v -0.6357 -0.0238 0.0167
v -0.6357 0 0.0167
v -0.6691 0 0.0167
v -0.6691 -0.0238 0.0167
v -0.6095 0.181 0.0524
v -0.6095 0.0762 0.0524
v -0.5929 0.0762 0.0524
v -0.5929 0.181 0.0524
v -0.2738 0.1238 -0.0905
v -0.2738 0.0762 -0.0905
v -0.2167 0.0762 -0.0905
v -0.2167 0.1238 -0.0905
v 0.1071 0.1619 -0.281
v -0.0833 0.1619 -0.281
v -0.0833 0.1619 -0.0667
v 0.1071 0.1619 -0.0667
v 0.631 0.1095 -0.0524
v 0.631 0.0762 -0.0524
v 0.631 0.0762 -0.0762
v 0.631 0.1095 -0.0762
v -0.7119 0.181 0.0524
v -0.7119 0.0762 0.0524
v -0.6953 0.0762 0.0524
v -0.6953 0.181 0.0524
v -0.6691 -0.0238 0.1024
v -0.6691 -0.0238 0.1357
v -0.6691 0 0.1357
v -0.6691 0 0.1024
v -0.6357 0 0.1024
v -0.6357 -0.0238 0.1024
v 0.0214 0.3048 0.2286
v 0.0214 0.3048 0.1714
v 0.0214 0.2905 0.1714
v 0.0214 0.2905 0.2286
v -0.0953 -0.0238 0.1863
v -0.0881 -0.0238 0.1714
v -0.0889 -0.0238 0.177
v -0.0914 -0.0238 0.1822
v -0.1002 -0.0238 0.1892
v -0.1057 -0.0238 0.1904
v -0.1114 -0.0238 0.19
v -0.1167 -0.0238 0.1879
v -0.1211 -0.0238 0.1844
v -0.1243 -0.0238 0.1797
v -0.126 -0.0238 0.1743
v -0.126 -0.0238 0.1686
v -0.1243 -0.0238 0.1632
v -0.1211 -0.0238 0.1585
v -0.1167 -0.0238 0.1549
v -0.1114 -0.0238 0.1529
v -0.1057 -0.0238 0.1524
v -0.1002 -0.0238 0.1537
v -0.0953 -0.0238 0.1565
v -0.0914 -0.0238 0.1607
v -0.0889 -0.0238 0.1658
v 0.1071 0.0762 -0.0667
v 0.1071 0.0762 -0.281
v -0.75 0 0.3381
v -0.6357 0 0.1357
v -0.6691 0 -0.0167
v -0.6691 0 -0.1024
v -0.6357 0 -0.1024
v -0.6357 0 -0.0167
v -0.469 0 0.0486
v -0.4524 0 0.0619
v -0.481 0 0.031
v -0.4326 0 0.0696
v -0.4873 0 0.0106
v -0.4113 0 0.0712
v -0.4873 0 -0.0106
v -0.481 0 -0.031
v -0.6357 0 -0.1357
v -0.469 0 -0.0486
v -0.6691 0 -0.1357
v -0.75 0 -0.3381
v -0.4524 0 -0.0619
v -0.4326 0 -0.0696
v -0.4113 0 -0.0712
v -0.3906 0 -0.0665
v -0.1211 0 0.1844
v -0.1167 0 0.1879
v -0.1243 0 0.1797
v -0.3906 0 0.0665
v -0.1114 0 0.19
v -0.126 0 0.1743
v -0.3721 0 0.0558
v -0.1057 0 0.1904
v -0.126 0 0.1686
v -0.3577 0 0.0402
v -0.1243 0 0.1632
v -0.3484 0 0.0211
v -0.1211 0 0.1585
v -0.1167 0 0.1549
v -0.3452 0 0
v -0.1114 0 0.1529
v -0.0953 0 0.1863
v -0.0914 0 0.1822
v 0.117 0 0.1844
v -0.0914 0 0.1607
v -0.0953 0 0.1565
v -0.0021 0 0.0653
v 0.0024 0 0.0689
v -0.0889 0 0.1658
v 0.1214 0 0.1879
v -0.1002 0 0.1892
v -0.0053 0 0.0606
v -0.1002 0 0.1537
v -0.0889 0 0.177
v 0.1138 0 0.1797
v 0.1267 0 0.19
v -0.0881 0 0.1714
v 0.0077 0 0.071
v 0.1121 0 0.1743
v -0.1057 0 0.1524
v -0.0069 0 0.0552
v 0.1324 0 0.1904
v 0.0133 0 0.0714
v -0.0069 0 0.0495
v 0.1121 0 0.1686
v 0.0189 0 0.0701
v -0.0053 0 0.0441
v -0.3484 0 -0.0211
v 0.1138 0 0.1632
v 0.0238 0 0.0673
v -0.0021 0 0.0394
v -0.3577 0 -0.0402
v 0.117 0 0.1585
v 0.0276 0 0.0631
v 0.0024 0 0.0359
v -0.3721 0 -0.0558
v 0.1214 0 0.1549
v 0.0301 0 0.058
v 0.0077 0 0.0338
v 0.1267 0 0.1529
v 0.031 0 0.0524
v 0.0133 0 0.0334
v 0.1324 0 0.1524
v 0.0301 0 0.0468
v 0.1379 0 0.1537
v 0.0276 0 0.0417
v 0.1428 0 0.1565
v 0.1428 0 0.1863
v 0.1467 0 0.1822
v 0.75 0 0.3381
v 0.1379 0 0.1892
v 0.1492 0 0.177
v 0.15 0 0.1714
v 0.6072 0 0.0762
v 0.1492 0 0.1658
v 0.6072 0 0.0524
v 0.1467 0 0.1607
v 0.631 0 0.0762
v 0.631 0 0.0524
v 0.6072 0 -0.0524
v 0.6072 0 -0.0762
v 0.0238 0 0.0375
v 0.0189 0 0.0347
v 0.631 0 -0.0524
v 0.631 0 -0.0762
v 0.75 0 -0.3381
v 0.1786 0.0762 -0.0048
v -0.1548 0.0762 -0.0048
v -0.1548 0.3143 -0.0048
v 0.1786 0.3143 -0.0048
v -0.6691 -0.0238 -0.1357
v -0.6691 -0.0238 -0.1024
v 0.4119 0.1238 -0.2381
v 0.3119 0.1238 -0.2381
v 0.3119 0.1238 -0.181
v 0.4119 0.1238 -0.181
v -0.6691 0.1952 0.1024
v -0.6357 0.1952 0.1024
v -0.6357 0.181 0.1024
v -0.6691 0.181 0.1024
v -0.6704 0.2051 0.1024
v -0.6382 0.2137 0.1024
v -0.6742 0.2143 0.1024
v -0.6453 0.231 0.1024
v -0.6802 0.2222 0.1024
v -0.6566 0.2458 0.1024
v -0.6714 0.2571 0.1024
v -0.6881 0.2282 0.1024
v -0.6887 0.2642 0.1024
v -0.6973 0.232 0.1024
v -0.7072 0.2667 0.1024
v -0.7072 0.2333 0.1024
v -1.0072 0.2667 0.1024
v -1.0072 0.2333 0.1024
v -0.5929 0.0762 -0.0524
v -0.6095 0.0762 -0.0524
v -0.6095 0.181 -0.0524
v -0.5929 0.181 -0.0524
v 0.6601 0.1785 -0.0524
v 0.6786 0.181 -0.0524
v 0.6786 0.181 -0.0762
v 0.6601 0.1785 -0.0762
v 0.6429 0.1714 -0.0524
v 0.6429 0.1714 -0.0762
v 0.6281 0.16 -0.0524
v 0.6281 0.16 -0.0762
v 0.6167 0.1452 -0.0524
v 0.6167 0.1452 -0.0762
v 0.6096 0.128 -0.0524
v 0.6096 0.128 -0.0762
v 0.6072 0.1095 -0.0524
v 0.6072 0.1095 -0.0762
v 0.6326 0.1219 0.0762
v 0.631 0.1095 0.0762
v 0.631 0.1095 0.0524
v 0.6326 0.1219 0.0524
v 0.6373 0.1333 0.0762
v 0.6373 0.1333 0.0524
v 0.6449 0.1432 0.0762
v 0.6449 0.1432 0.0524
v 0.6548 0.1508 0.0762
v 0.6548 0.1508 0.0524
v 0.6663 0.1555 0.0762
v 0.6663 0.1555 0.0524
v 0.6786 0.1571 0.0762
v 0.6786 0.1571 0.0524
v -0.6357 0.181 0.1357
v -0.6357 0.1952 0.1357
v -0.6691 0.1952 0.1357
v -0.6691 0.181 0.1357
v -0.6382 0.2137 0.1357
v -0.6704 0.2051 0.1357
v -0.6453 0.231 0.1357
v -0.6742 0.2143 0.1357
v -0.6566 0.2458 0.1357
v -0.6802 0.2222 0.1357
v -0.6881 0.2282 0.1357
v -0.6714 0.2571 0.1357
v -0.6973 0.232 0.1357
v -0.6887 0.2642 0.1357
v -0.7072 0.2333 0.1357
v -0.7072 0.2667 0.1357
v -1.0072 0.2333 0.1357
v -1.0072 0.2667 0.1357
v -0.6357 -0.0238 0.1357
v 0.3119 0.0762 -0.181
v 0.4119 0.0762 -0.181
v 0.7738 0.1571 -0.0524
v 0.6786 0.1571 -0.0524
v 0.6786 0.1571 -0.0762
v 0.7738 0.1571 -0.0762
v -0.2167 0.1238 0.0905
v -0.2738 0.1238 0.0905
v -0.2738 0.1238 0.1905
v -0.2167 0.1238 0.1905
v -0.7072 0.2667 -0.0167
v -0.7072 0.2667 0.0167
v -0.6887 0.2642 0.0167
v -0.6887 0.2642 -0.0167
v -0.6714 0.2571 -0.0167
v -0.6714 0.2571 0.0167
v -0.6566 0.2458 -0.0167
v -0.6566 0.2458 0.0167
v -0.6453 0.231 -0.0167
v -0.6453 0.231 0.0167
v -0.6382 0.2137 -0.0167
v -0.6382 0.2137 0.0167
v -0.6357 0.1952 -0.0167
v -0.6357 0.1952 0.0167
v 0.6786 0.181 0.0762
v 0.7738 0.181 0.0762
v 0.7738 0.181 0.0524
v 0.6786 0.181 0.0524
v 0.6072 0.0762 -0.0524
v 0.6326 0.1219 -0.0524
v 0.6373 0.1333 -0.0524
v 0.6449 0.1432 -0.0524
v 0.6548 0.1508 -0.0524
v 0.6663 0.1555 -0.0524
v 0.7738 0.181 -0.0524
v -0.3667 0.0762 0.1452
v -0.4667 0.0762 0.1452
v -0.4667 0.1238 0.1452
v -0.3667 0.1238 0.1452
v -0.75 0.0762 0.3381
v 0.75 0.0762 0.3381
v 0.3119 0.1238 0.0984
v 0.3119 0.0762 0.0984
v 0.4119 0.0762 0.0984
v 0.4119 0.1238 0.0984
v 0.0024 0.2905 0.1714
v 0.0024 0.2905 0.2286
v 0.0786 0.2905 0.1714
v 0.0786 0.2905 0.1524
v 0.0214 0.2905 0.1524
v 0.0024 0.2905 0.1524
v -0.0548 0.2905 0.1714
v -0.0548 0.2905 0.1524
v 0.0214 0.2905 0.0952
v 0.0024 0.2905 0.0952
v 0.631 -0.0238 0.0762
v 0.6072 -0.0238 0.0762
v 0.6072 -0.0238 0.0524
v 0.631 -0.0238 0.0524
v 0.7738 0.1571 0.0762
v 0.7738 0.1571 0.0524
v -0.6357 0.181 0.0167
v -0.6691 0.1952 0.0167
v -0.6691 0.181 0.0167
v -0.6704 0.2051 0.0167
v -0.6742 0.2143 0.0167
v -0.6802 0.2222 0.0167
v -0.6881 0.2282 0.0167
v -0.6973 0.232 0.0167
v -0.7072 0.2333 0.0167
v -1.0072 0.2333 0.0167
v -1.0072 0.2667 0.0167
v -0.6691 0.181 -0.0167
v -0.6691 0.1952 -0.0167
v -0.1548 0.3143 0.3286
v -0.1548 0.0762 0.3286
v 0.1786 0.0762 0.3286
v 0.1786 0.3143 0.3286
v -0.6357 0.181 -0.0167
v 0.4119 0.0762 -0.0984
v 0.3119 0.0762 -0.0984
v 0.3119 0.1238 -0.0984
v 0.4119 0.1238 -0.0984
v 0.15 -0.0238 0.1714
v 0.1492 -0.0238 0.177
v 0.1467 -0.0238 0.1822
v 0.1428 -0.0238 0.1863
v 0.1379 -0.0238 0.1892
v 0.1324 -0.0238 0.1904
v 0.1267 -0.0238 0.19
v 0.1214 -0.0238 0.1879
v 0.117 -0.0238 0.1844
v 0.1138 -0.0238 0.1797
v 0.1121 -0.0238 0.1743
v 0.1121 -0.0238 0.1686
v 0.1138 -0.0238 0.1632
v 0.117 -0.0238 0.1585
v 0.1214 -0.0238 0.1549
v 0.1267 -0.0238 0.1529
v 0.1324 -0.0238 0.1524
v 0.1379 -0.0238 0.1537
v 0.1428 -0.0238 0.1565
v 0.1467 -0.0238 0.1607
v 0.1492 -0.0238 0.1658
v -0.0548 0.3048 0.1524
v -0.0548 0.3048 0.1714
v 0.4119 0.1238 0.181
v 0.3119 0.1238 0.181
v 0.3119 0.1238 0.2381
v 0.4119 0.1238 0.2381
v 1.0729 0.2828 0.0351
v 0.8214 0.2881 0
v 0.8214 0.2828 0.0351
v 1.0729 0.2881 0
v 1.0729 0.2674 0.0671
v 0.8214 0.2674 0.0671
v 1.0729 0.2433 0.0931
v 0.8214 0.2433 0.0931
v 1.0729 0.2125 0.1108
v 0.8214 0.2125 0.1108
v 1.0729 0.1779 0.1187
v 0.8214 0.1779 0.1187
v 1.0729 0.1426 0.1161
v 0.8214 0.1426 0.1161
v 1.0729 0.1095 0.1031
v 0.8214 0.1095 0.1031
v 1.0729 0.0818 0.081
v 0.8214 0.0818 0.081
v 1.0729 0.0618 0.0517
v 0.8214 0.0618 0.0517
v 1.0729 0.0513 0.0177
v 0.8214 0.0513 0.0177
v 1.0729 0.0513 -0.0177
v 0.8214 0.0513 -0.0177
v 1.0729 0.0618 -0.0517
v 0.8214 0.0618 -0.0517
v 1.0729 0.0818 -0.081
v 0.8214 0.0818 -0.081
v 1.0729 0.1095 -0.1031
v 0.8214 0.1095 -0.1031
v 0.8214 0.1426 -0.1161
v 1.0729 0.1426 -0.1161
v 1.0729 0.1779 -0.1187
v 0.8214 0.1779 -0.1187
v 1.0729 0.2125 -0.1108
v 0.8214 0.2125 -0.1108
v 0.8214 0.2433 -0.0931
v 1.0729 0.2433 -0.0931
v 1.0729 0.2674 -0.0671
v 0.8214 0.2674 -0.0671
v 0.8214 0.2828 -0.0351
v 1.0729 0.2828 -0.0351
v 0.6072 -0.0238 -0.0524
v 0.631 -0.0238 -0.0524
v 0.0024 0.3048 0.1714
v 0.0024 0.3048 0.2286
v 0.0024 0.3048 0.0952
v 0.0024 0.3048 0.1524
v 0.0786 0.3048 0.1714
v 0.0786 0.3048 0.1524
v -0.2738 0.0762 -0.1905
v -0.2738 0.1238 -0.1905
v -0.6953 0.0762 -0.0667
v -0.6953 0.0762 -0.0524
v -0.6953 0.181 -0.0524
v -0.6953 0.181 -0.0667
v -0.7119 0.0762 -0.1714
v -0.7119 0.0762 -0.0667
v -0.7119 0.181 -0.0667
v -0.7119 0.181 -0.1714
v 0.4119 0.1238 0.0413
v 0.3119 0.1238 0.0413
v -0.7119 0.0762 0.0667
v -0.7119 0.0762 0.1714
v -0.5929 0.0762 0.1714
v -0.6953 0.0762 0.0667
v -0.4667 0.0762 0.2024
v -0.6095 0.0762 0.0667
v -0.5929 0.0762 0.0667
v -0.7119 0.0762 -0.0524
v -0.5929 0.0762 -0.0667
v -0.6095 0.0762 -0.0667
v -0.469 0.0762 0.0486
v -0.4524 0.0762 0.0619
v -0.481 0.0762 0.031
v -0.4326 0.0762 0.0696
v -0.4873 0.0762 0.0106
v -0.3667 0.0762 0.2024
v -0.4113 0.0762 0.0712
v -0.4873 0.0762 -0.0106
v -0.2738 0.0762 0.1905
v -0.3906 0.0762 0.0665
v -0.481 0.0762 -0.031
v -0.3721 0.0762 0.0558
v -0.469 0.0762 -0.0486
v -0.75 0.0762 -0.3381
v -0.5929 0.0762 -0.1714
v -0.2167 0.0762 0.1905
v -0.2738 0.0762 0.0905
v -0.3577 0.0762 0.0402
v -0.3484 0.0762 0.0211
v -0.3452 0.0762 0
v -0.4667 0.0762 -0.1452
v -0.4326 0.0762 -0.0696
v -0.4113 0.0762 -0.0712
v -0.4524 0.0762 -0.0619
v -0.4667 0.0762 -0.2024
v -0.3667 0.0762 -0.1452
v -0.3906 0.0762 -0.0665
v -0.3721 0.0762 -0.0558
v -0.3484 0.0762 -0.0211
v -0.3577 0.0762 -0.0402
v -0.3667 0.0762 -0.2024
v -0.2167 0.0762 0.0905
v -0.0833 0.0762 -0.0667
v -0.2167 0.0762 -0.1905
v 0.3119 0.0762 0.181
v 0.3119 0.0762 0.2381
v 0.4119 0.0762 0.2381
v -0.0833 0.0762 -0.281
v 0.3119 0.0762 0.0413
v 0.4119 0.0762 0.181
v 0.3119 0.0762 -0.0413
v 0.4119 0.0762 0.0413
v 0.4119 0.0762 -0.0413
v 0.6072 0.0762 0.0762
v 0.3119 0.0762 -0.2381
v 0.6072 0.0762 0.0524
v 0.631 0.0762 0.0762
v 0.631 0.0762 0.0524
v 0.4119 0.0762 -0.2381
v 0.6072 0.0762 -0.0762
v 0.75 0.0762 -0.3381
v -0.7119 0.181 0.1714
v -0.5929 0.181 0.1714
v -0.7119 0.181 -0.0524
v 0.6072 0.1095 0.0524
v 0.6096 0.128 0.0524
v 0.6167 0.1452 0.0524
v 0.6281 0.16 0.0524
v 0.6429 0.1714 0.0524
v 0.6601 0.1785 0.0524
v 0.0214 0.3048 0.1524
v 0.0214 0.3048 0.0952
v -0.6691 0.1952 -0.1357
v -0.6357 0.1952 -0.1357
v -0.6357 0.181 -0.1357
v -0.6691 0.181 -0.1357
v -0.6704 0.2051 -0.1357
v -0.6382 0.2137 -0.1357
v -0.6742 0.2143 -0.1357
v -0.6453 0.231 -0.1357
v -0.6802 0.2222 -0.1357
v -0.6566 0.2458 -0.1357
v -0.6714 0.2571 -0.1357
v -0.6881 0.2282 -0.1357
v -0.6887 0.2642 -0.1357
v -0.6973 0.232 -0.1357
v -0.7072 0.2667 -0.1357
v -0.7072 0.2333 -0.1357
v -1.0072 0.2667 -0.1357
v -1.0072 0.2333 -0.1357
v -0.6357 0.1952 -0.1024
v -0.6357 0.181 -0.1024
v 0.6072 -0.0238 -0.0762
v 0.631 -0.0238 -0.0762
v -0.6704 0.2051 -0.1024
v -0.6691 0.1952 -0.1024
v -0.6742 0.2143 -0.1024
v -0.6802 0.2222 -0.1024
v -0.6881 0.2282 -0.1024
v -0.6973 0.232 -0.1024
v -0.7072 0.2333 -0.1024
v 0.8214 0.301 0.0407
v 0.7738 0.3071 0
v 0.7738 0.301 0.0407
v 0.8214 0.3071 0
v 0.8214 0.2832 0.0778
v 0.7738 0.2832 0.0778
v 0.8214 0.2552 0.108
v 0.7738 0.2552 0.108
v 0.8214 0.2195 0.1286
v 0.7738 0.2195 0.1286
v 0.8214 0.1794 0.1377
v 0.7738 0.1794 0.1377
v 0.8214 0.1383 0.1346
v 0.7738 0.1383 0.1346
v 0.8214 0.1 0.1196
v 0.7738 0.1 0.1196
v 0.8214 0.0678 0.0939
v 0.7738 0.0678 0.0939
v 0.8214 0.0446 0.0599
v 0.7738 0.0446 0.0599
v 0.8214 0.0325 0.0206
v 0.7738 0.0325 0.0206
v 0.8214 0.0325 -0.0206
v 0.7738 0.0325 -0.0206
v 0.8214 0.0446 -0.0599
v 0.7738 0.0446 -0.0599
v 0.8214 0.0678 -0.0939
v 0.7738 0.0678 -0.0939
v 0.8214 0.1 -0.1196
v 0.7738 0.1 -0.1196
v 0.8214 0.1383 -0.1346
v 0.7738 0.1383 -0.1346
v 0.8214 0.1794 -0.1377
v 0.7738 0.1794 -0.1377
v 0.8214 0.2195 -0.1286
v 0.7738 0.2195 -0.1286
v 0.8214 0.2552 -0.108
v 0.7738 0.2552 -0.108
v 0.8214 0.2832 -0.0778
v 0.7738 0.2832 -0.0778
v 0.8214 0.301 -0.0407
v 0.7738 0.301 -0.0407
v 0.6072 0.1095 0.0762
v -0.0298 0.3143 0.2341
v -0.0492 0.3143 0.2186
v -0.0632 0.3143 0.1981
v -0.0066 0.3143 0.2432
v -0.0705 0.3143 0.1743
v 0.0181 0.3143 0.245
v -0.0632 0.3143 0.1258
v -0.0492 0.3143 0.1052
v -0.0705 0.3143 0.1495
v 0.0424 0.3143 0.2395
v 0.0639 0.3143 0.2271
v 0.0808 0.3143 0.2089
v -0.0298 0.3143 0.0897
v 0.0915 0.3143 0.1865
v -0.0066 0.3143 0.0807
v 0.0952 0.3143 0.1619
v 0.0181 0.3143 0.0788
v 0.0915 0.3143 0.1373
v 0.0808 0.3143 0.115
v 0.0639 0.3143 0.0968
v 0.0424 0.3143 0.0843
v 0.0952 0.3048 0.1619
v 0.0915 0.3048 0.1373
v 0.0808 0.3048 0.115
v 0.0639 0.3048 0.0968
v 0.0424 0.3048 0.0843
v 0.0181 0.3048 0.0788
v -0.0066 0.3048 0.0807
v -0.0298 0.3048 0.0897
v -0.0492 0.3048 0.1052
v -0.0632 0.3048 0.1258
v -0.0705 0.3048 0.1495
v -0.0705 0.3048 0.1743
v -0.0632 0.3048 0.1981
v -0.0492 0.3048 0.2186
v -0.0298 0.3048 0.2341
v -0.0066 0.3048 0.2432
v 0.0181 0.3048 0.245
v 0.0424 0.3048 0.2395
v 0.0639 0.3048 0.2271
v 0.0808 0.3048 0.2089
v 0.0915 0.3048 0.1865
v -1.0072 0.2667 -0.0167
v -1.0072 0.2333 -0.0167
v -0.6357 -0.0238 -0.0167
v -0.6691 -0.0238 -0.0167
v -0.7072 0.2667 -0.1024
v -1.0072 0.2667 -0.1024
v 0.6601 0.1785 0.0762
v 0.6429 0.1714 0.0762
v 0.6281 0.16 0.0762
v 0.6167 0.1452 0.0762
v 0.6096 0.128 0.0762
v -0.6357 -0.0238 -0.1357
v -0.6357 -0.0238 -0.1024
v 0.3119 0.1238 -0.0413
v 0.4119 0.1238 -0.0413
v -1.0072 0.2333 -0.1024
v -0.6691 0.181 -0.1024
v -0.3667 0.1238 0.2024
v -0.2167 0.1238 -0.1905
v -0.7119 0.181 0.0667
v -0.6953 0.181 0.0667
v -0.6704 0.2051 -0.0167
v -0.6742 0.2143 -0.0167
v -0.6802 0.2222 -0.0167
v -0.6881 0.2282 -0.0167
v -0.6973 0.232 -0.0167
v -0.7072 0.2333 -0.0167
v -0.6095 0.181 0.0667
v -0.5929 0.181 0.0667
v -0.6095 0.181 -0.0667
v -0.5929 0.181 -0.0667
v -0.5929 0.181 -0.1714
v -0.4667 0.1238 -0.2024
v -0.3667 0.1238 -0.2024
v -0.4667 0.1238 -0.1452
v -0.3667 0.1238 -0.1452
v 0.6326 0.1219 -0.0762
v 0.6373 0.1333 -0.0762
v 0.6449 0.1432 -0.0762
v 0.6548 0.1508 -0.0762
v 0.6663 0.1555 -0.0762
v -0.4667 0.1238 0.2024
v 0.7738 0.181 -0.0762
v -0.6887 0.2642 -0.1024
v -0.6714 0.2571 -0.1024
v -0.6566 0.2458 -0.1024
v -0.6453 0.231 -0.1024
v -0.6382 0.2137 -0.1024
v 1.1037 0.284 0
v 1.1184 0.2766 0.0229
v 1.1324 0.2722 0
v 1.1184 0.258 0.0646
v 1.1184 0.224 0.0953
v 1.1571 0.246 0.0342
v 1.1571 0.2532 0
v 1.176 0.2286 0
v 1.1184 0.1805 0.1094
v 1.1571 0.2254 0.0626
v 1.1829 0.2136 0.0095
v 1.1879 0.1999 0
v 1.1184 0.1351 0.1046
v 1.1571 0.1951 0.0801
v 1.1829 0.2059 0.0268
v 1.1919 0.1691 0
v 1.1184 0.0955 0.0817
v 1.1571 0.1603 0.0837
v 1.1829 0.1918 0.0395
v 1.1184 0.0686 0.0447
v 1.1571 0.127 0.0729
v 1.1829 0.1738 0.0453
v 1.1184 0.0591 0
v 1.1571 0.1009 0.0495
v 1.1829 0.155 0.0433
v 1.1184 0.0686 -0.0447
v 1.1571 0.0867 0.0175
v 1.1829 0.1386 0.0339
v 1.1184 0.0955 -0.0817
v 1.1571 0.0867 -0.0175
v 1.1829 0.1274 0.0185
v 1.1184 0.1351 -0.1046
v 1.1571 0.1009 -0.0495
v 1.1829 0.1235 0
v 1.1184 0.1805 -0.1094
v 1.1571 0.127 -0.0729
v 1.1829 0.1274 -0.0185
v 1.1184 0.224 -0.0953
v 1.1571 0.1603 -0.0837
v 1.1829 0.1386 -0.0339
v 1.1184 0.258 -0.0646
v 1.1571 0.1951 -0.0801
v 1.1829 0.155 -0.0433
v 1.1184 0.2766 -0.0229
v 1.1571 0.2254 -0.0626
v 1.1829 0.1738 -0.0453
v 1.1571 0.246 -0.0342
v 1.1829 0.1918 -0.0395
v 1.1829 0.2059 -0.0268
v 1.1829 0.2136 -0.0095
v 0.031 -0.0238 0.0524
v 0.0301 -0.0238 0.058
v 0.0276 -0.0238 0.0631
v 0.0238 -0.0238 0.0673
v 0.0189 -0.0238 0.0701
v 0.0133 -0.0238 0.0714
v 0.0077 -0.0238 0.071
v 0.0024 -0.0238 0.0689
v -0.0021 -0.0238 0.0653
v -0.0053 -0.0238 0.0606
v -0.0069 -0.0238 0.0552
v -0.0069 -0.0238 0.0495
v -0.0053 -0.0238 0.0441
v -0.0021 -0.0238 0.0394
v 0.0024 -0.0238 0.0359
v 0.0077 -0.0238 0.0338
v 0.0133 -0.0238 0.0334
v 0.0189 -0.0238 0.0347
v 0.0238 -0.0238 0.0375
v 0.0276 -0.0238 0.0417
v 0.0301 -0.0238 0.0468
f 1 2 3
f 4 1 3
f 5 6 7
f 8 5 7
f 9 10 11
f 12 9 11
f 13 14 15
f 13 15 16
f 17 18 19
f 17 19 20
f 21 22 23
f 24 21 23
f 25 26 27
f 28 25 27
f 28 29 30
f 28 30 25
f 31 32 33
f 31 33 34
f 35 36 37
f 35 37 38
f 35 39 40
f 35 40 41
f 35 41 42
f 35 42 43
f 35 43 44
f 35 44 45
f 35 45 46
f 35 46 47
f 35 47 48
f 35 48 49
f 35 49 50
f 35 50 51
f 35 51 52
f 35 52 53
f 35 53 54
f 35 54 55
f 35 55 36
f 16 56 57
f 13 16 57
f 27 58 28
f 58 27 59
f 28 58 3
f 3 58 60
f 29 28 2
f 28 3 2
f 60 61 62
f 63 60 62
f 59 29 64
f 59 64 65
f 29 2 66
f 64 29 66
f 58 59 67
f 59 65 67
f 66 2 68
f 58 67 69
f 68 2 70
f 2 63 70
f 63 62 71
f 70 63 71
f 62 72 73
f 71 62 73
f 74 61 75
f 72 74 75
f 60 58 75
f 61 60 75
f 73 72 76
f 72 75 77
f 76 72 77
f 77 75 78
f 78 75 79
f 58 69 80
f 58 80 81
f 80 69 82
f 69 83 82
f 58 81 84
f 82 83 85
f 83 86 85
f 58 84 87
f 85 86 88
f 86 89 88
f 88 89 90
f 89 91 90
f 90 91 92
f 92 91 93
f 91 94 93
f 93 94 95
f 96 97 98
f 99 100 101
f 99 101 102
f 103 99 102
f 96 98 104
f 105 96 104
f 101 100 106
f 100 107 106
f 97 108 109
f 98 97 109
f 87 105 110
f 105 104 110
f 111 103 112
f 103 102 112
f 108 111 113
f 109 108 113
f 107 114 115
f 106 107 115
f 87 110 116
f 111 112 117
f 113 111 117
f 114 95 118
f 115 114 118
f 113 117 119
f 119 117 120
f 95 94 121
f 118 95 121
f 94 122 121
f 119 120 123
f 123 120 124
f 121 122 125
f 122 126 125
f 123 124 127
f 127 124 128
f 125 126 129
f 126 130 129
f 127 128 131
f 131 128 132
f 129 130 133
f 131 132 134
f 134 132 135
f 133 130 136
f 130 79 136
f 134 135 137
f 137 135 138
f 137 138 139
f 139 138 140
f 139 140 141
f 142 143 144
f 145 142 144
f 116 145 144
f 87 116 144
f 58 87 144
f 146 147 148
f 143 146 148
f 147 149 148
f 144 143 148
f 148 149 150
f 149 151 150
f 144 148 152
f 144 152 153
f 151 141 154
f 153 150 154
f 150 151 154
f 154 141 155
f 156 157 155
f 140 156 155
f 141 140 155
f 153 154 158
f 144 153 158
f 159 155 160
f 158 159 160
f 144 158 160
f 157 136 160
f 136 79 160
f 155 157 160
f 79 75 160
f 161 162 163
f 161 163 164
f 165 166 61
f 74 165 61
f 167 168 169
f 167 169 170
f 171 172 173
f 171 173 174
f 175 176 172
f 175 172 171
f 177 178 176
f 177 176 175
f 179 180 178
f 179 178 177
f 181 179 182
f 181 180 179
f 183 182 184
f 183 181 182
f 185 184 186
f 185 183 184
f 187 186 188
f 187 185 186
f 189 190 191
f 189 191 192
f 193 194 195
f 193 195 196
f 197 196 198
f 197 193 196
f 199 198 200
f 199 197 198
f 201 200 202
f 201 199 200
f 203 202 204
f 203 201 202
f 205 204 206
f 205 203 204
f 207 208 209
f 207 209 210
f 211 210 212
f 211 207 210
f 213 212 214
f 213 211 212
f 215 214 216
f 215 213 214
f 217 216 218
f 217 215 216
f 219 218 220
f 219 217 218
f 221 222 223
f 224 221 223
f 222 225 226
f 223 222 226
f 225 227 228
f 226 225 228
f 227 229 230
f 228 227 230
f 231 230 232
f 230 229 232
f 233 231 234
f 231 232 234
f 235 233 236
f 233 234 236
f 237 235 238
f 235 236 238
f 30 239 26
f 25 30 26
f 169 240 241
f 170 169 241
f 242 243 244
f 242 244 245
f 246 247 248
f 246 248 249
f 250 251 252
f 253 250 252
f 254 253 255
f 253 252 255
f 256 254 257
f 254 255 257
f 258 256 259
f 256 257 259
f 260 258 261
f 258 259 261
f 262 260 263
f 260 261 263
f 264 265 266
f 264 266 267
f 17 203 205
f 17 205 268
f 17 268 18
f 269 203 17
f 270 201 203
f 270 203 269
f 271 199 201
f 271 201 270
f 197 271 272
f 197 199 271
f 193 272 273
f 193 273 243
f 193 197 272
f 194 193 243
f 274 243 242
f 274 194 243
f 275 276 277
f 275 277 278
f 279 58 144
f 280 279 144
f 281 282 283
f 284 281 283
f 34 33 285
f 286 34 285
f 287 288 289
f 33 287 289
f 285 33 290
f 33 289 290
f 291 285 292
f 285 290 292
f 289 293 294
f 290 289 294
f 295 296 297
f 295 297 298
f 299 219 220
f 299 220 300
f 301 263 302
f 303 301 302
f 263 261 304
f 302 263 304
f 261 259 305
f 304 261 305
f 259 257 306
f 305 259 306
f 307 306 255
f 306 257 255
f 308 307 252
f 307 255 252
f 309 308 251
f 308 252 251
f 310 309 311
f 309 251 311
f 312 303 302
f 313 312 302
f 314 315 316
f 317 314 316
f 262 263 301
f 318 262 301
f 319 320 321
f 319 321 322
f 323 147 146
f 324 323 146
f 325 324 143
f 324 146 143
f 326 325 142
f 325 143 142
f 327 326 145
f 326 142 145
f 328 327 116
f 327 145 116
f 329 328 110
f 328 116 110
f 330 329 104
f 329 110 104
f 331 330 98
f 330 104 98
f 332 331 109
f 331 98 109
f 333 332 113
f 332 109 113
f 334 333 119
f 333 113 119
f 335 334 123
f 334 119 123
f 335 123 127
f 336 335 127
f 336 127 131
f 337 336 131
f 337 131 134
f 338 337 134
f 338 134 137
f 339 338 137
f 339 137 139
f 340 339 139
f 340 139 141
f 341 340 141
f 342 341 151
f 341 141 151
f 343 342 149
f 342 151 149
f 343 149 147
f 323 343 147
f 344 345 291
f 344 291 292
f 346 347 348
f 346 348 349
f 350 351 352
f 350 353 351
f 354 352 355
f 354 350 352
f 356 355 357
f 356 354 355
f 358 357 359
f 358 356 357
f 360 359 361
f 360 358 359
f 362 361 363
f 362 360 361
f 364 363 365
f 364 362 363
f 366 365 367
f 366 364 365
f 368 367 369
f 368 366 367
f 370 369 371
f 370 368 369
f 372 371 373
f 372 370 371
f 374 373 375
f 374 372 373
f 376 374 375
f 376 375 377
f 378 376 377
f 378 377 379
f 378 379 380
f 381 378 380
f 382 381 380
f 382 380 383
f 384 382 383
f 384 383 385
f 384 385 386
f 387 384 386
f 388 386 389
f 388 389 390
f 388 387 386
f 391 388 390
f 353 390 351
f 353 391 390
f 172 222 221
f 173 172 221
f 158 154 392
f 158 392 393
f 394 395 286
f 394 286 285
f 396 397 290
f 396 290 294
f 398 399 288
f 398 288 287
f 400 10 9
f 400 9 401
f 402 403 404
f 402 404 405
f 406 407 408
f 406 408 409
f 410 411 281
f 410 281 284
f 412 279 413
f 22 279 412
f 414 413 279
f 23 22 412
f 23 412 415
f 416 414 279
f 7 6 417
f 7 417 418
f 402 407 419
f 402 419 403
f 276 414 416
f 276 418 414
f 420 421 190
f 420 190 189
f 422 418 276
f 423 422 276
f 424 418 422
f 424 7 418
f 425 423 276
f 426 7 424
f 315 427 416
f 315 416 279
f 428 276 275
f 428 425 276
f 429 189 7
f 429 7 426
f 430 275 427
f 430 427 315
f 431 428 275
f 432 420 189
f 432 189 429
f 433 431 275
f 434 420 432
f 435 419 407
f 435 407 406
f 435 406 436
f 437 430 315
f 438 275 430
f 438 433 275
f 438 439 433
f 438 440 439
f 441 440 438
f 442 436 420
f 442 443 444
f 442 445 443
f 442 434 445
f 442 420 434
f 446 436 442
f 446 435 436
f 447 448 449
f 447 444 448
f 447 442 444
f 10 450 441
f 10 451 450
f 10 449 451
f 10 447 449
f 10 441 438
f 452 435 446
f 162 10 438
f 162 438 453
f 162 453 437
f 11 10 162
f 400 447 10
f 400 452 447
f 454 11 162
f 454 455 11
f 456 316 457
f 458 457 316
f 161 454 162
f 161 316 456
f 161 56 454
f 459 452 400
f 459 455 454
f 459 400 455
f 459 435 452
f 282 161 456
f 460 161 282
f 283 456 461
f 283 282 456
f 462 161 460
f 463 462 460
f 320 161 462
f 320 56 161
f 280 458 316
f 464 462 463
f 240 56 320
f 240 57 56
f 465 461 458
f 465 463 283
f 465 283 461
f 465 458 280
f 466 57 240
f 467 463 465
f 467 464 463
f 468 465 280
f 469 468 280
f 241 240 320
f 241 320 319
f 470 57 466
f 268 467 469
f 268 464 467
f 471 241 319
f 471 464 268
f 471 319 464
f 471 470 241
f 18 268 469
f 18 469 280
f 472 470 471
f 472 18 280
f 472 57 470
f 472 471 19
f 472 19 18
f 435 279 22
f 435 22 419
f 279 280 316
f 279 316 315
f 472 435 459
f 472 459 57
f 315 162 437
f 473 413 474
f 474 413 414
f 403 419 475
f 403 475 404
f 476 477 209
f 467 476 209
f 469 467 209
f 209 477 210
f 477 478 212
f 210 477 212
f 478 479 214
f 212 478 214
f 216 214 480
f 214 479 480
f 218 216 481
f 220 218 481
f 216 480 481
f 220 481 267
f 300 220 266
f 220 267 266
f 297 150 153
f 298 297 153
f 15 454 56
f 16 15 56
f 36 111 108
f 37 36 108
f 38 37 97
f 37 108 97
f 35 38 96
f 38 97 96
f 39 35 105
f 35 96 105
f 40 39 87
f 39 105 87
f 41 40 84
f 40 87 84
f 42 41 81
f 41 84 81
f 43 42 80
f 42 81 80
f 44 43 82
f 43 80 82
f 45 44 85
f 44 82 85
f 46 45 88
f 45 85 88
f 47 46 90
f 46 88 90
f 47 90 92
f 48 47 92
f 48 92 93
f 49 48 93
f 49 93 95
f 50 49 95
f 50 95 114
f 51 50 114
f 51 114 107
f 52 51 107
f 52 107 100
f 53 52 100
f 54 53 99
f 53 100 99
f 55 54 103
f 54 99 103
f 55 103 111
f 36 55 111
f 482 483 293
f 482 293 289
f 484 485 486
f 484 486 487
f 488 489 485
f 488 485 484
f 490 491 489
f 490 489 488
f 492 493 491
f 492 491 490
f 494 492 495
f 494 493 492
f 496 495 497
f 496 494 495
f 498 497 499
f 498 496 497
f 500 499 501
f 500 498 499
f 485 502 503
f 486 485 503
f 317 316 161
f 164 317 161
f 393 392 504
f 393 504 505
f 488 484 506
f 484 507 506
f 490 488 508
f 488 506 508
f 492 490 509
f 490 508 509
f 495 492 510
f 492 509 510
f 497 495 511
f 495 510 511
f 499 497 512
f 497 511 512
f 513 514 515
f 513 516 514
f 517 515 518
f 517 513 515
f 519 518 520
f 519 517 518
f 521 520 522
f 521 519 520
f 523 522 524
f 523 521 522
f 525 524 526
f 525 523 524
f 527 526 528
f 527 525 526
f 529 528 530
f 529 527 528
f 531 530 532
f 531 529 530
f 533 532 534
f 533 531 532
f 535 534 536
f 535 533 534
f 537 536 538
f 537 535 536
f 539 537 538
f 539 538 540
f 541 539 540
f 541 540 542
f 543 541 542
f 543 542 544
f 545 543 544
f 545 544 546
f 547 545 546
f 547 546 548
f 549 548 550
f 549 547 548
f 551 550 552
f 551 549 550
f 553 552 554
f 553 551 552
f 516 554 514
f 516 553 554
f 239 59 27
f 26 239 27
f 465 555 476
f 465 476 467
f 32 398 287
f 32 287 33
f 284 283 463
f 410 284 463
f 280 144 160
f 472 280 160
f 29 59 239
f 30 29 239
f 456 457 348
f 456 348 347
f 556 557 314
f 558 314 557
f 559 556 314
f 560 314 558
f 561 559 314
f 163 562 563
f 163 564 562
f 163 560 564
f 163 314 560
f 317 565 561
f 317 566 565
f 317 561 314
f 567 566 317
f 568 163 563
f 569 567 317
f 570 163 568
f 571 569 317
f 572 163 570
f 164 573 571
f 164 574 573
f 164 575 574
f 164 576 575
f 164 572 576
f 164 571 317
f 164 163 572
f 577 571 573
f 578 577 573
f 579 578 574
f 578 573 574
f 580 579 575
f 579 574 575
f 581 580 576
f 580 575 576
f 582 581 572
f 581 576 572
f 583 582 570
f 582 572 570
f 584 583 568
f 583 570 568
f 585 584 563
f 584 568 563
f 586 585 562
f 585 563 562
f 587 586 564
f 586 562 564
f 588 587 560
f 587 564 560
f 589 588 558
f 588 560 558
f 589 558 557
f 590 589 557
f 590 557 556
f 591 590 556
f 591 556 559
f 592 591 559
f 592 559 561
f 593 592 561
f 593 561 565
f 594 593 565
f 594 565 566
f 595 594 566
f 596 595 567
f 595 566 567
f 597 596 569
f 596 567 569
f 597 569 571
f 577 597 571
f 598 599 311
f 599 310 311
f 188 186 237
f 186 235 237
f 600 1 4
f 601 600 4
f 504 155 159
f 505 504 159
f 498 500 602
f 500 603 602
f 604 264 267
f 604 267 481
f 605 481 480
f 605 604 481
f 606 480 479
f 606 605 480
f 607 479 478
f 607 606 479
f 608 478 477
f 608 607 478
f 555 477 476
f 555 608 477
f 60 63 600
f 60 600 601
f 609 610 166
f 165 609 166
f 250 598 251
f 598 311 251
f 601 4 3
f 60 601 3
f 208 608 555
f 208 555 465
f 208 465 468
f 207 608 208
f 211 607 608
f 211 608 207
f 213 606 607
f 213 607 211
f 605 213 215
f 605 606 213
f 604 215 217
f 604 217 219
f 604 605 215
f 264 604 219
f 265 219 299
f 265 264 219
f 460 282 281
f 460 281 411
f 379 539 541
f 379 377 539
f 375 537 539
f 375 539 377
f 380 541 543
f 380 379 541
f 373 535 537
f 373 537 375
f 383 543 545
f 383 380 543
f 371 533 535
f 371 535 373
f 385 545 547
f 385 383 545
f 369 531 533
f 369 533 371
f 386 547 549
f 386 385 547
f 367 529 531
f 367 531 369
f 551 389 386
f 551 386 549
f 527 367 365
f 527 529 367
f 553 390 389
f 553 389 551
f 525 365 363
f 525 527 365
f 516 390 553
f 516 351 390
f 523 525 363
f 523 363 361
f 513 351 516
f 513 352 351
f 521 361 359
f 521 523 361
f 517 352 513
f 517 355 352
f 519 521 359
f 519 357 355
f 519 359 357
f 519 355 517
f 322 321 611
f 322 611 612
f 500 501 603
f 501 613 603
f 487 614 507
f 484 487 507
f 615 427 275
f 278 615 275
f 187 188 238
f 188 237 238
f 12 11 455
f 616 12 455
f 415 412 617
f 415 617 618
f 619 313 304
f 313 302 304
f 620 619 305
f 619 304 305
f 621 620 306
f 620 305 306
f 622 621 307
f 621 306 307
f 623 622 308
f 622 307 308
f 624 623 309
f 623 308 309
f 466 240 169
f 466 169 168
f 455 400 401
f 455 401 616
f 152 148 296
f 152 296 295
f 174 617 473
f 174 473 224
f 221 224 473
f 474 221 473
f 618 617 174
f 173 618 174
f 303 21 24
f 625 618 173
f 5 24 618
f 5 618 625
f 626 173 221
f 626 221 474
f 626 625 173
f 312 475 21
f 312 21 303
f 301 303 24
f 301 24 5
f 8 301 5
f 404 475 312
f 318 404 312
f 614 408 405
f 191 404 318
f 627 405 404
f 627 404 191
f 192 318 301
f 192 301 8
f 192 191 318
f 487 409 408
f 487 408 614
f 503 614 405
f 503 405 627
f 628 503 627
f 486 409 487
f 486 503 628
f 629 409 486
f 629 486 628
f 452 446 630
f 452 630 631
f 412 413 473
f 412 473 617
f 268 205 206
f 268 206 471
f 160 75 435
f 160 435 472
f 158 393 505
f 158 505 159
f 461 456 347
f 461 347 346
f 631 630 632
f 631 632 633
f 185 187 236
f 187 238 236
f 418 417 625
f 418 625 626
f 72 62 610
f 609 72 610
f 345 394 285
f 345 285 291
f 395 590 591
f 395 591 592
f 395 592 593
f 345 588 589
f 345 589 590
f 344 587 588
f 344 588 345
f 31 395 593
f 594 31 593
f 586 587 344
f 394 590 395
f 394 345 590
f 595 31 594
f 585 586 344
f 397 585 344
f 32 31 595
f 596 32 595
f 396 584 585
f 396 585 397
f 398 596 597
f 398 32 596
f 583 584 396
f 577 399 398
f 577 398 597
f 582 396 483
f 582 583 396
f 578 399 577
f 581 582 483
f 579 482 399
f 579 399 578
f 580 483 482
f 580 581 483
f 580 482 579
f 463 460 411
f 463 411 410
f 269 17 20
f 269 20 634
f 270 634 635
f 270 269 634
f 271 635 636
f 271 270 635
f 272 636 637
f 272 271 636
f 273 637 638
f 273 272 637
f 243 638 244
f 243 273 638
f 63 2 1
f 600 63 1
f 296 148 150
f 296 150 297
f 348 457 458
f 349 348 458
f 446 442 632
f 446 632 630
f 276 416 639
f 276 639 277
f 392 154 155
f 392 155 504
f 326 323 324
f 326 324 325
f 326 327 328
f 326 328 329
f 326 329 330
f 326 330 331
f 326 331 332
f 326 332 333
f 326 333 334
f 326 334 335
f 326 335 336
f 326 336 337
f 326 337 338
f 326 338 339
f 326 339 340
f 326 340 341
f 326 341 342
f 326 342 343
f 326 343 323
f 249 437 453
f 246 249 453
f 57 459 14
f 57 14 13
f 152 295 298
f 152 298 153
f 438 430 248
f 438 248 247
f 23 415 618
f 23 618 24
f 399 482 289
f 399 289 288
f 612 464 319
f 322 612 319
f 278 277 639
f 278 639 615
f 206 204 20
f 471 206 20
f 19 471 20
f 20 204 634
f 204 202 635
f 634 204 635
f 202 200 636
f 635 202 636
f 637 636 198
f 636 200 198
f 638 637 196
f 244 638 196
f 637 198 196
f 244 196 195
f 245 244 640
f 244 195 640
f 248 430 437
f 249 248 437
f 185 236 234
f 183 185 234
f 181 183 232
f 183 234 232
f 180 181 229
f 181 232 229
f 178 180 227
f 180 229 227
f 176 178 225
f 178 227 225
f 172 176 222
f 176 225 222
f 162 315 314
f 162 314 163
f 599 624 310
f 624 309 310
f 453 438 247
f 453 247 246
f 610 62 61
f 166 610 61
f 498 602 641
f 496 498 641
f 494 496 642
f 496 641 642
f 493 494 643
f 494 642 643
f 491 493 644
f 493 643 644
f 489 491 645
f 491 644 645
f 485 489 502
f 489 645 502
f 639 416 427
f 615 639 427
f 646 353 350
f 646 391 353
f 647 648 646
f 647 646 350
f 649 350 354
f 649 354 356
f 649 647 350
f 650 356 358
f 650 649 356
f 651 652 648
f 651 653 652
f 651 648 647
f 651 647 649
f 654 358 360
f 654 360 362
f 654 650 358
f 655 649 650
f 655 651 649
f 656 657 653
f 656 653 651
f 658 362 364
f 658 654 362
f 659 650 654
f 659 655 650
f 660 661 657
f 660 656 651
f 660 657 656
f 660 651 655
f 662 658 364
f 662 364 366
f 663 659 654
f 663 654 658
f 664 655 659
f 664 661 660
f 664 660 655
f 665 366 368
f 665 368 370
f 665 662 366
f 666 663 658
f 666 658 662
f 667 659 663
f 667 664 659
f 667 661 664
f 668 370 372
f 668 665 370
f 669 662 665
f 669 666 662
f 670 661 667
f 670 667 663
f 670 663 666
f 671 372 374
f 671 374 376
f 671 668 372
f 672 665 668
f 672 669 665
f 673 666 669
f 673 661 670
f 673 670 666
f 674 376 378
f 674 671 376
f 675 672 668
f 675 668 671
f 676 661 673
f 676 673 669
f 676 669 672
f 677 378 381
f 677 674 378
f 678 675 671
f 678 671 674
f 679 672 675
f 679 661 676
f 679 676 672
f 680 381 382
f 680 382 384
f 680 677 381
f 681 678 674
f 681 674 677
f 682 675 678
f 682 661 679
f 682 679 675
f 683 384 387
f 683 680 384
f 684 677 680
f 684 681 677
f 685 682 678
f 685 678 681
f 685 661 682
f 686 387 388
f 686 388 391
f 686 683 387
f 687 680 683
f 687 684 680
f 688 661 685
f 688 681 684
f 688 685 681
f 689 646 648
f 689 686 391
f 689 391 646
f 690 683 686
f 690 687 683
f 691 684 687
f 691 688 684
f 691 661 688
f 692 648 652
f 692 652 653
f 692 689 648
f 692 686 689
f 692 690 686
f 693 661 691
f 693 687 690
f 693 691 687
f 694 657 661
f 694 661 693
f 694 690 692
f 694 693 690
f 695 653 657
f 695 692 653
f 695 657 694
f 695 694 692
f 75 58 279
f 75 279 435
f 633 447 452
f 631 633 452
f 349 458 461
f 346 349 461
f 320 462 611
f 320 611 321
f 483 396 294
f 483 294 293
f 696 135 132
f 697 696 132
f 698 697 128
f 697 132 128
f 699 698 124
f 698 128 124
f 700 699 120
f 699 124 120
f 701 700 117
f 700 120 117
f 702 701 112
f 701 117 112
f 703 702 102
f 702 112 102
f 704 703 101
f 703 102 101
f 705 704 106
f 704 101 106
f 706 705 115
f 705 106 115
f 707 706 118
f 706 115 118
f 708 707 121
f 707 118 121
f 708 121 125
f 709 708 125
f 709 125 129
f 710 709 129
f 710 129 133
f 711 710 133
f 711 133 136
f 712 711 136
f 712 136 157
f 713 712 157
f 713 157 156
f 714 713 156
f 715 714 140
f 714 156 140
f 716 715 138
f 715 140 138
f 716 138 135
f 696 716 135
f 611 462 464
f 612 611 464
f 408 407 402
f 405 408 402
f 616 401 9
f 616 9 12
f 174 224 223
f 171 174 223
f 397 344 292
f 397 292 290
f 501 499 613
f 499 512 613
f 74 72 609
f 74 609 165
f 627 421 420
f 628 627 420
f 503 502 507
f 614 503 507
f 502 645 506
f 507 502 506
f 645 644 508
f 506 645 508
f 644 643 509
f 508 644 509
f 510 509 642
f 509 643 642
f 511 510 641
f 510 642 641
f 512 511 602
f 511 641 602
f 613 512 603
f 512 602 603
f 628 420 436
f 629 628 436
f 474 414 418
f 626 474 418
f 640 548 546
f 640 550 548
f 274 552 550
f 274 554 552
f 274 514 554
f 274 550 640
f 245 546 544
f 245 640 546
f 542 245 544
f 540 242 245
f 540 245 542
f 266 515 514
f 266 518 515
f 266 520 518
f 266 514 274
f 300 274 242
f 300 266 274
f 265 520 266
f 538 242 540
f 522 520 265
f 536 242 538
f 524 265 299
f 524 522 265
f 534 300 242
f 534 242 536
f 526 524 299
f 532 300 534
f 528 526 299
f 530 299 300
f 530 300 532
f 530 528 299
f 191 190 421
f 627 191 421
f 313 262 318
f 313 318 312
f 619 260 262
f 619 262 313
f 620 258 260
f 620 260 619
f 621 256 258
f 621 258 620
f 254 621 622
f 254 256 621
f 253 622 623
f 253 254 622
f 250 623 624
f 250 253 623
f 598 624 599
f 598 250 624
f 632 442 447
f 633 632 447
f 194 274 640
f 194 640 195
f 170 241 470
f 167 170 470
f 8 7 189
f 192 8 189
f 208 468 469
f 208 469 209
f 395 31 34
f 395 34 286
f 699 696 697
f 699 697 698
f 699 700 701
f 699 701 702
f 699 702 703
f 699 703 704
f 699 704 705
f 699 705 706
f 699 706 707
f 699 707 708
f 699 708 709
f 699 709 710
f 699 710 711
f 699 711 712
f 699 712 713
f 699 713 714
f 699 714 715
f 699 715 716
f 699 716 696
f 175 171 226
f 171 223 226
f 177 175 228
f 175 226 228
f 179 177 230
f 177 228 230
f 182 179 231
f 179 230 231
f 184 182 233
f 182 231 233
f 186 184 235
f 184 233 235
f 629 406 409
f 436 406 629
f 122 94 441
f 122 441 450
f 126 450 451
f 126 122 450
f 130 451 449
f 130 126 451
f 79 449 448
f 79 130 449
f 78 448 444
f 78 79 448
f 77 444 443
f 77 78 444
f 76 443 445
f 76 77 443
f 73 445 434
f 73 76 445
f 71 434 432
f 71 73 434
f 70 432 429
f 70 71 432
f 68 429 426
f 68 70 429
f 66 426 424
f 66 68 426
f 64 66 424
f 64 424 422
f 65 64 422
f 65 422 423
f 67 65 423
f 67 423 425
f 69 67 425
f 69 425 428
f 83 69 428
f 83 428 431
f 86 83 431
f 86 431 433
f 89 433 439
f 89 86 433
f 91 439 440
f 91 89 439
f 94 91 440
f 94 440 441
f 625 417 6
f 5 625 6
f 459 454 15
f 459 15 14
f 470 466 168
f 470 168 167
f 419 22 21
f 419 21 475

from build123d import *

# Parameters (mm, degrees)
SKETCH_1_W             = 31.5
SKETCH_1_H             = 14.2
SKETCH_1_R             = 1.5
EXTRUDE_1_DEPTH        = 1.6
SKETCH_2_W             = 7
SKETCH_2_H             = 7
EXTRUDE_2_DEPTH        = 5
SKETCH_3_R             = 1.75
CUT_EXTRUDE_1_DEPTH    = 0.2
CUT_EXTRUDE_2_DEPTH    = 0.3
SKETCH_6_W             = 4
SKETCH_6_H             = 4.5
EXTRUDE_3_DEPTH        = 1.8
SKETCH_7_W             = 2.1
SKETCH_7_H             = 1.2
SKETCH_7_W_2           = 1.2
SKETCH_7_H_2           = 2.1
EXTRUDE_4_DEPTH        = 1
EXTRUDE_START          = 1.6
EXTRUDE_5_DEPTH        = 0.5
PATTERN_LINEAR_1_COUNT = 2
PATTERN_LINEAR_1_PITCH = 2.7
EXTRUDE_6_DEPTH        = 0.35
PATTERN_LINEAR_2_COUNT = 2
PATTERN_LINEAR_2_PITCH = 2.5
PATTERN_LINEAR_3_COUNT = 2
PATTERN_LINEAR_3_PITCH = 2.5
SKETCH_12_W            = 2.5
SKETCH_12_H            = 2.2
SKETCH_12_W_2          = 1.8
SKETCH_12_H_2          = 0.3
EXTRUDE_7_DEPTH        = 2.2
SKETCH_13_R            = 0.4
EXTRUDE_8_DEPTH        = 0.5
SCALE1_SCALE           = 0.04762


with BuildPart() as part:
    # Эскиз1 → Бобышка-Вытянуть1 (new body)
    with BuildSketch(Plane(origin=(0, 0, 0), x_dir=(1, 0, 0), z_dir=(0, 1, 0))):
        Rectangle(SKETCH_1_W, SKETCH_1_H)
        with Locations((-8.75, 0)):
            Circle(SKETCH_1_R, mode=Mode.SUBTRACT)
    extrude(amount=EXTRUDE_1_DEPTH)

    # Эскиз2 → Бобышка-Вытянуть2 (add)
    with BuildSketch(Plane(origin=(0, 1.6, 0), x_dir=(1, 0, 0), z_dir=(0, 1, 0))):
        with Locations((0.25, -3.4)):
            Rectangle(SKETCH_2_W, SKETCH_2_H)
    extrude(amount=EXTRUDE_2_DEPTH)

    # Эскиз3 → Вырез-Вытянуть1 (cut)
    with BuildSketch(Plane(origin=(0, 6.6, 0), x_dir=(1, 0, 0), z_dir=(0, 1, 0))):
        with Locations((0.25, -3.4)):
            Circle(SKETCH_3_R)
    extrude(amount=-CUT_EXTRUDE_1_DEPTH, mode=Mode.SUBTRACT)

    # Эскиз4 → Вырез-Вытянуть2 (cut)
    with BuildSketch(Plane(origin=(0, 6.4, 0), x_dir=(1, 0, 0), z_dir=(0, 1, 0))):
        Polygon((0.05, -2), (0.45, -2), (0.45, -3.2), (1.65, -3.2), (1.65, -3.6), (0.45, -3.6), (0.45, -4.8), (0.05, -4.8), (0.05, -3.6), (-1.15, -3.6), (-1.15, -3.2), (0.05, -3.2), align=None)
    extrude(amount=-CUT_EXTRUDE_2_DEPTH, mode=Mode.SUBTRACT)

    # Эскиз6 → Бобышка-Вытянуть3 (add)
    with BuildSketch(Plane(origin=(0, 1.6, 0), x_dir=(1, 0, 0), z_dir=(0, 1, 0))):
        with Locations((0.25, 3.65)):
            Rectangle(SKETCH_6_W, SKETCH_6_H)
    extrude(amount=EXTRUDE_3_DEPTH)

    # Эскиз7 → Бобышка-Вытянуть4 (add)
    with BuildSketch(Plane(origin=(0, 1.6, 0), x_dir=(1, 0, 0), z_dir=(0, 1, 0))):
        with Locations((7.6, 1.466666667)):
            Rectangle(SKETCH_7_W, SKETCH_7_H)
        with Locations((7.6, 4.4)):
            Rectangle(SKETCH_7_W, SKETCH_7_H)
        with Locations((-8.75, 3.65)):
            Rectangle(SKETCH_7_W, SKETCH_7_H)
        with Locations((-5.15, 2.95)):
            Rectangle(SKETCH_7_W_2, SKETCH_7_H_2)
        with Locations((-5.15, -2.95)):
            Rectangle(SKETCH_7_W_2, SKETCH_7_H_2)
        with Locations((-8.75, -3.65)):
            Rectangle(SKETCH_7_W, SKETCH_7_H)
        with Locations((7.6, -4.4)):
            Rectangle(SKETCH_7_W, SKETCH_7_H)
        with Locations((7.6, -1.466666667)):
            Rectangle(SKETCH_7_W, SKETCH_7_H)
    extrude(amount=EXTRUDE_4_DEPTH)

    # Эскиз9 → Бобышка-Вытянуть5 (add)
    with BuildSketch(Plane.XY.offset(EXTRUDE_START)):
        with BuildLine():
            Line((12.75, 2.3), (12.75, -0.5))
            Line((12.75, -0.5), (13.25, -0.5))
            Line((13.25, -0.5), (13.25, 2.3))
            ThreePointArc((13.25, 2.3), (13.542893219, 3.007106781), (14.25, 3.3))
            Line((14.25, 3.3), (16.25, 3.3))
            Line((16.25, 3.3), (16.25, 3.8))
            Line((16.25, 3.8), (14.25, 3.8))
            ThreePointArc((14.25, 3.8), (13.189339828, 3.360660172), (12.75, 2.3))
        make_face()
    extrude_5 = extrude(amount=-EXTRUDE_5_DEPTH)

    # Линейный массив1: Бобышка-Вытянуть5 ×2
    with Locations(*[(0, 0, -i * PATTERN_LINEAR_1_PITCH) for i in range(1, PATTERN_LINEAR_1_COUNT)]):
        add(extrude_5)

    # Эскиз10 → Повернуть1 (revolve)
    with BuildSketch(Plane.XY):
        with BuildLine():
            Line((16.25, 3.55), (16.25, 6.45))
            Line((16.25, 6.45), (17.25, 6.45))
            Line((17.25, 6.45), (17.25, 6.05))
            Line((17.25, 6.05), (22.53, 6.05))
            ThreePointArc((22.53, 6.05), (24.297766953, 5.317766953), (25.03, 3.55))
            Line((25.03, 3.55), (16.25, 3.55))
        make_face()
    revolve(axis=Axis((16.25, 3.55, 0), (1, 0, 0)))

    # Эскиз11 → Бобышка-Вытянуть6 (add, symmetric)
    with BuildSketch(Plane.XY):
        with BuildLine():
            Line((-13.35, -0.5), (-14.05, -0.5))
            Line((-14.05, -0.5), (-14.05, 4.1))
            ThreePointArc((-14.05, 4.1), (-14.284314575, 4.665685425), (-14.85, 4.9))
            Line((-14.85, 4.9), (-21.15, 4.9))
            Line((-21.15, 4.9), (-21.15, 5.6))
            Line((-21.15, 5.6), (-14.85, 5.6))
            ThreePointArc((-14.85, 5.6), (-13.789339828, 5.160660172), (-13.35, 4.1))
            Line((-13.35, 4.1), (-13.35, -0.5))
        make_face()
    extrude_6 = extrude(amount=EXTRUDE_6_DEPTH, both=True)

    # Линейный массив2: Бобышка-Вытянуть6 ×2
    with Locations(*[(0, 0, i * PATTERN_LINEAR_2_PITCH) for i in range(1, PATTERN_LINEAR_2_COUNT)]):
        add(extrude_6)

    # Линейный массив3: Бобышка-Вытянуть6 ×2
    with Locations(*[(0, 0, -i * PATTERN_LINEAR_3_PITCH) for i in range(1, PATTERN_LINEAR_3_COUNT)]):
        add(extrude_6)

    # Эскиз12 → Бобышка-Вытянуть7 (add)
    with BuildSketch(Plane(origin=(0, 1.6, 0), x_dir=(1, 0, 0), z_dir=(0, 1, 0))):
        with Locations((-13.7, 2.5)):
            Rectangle(SKETCH_12_W, SKETCH_12_H)
        with Locations((-13.7, 1.25)):
            Rectangle(SKETCH_12_W_2, SKETCH_12_H_2)
        with Locations((-13.7, 0)):
            Rectangle(SKETCH_12_W, SKETCH_12_H)
        with Locations((-13.7, -1.25)):
            Rectangle(SKETCH_12_W_2, SKETCH_12_H_2)
        with Locations((-13.7, -2.5)):
            Rectangle(SKETCH_12_W, SKETCH_12_H)
    extrude(amount=EXTRUDE_7_DEPTH)

    # Эскиз13 → Бобышка-Вытянуть8 (add)
    with BuildSketch(Plane.XZ):
        with Locations((-2.25, 3.6)):
            Circle(SKETCH_13_R)
        with Locations((0.25, 1.1)):
            Circle(SKETCH_13_R)
        with Locations((2.75, 3.6)):
            Circle(SKETCH_13_R)
    extrude(amount=EXTRUDE_8_DEPTH)


with BuildPart() as part_1:
    # Scale1: scaled about (0, 0, 0)
    add(part.part.scale(SCALE1_SCALE))


solid = part_1.part
